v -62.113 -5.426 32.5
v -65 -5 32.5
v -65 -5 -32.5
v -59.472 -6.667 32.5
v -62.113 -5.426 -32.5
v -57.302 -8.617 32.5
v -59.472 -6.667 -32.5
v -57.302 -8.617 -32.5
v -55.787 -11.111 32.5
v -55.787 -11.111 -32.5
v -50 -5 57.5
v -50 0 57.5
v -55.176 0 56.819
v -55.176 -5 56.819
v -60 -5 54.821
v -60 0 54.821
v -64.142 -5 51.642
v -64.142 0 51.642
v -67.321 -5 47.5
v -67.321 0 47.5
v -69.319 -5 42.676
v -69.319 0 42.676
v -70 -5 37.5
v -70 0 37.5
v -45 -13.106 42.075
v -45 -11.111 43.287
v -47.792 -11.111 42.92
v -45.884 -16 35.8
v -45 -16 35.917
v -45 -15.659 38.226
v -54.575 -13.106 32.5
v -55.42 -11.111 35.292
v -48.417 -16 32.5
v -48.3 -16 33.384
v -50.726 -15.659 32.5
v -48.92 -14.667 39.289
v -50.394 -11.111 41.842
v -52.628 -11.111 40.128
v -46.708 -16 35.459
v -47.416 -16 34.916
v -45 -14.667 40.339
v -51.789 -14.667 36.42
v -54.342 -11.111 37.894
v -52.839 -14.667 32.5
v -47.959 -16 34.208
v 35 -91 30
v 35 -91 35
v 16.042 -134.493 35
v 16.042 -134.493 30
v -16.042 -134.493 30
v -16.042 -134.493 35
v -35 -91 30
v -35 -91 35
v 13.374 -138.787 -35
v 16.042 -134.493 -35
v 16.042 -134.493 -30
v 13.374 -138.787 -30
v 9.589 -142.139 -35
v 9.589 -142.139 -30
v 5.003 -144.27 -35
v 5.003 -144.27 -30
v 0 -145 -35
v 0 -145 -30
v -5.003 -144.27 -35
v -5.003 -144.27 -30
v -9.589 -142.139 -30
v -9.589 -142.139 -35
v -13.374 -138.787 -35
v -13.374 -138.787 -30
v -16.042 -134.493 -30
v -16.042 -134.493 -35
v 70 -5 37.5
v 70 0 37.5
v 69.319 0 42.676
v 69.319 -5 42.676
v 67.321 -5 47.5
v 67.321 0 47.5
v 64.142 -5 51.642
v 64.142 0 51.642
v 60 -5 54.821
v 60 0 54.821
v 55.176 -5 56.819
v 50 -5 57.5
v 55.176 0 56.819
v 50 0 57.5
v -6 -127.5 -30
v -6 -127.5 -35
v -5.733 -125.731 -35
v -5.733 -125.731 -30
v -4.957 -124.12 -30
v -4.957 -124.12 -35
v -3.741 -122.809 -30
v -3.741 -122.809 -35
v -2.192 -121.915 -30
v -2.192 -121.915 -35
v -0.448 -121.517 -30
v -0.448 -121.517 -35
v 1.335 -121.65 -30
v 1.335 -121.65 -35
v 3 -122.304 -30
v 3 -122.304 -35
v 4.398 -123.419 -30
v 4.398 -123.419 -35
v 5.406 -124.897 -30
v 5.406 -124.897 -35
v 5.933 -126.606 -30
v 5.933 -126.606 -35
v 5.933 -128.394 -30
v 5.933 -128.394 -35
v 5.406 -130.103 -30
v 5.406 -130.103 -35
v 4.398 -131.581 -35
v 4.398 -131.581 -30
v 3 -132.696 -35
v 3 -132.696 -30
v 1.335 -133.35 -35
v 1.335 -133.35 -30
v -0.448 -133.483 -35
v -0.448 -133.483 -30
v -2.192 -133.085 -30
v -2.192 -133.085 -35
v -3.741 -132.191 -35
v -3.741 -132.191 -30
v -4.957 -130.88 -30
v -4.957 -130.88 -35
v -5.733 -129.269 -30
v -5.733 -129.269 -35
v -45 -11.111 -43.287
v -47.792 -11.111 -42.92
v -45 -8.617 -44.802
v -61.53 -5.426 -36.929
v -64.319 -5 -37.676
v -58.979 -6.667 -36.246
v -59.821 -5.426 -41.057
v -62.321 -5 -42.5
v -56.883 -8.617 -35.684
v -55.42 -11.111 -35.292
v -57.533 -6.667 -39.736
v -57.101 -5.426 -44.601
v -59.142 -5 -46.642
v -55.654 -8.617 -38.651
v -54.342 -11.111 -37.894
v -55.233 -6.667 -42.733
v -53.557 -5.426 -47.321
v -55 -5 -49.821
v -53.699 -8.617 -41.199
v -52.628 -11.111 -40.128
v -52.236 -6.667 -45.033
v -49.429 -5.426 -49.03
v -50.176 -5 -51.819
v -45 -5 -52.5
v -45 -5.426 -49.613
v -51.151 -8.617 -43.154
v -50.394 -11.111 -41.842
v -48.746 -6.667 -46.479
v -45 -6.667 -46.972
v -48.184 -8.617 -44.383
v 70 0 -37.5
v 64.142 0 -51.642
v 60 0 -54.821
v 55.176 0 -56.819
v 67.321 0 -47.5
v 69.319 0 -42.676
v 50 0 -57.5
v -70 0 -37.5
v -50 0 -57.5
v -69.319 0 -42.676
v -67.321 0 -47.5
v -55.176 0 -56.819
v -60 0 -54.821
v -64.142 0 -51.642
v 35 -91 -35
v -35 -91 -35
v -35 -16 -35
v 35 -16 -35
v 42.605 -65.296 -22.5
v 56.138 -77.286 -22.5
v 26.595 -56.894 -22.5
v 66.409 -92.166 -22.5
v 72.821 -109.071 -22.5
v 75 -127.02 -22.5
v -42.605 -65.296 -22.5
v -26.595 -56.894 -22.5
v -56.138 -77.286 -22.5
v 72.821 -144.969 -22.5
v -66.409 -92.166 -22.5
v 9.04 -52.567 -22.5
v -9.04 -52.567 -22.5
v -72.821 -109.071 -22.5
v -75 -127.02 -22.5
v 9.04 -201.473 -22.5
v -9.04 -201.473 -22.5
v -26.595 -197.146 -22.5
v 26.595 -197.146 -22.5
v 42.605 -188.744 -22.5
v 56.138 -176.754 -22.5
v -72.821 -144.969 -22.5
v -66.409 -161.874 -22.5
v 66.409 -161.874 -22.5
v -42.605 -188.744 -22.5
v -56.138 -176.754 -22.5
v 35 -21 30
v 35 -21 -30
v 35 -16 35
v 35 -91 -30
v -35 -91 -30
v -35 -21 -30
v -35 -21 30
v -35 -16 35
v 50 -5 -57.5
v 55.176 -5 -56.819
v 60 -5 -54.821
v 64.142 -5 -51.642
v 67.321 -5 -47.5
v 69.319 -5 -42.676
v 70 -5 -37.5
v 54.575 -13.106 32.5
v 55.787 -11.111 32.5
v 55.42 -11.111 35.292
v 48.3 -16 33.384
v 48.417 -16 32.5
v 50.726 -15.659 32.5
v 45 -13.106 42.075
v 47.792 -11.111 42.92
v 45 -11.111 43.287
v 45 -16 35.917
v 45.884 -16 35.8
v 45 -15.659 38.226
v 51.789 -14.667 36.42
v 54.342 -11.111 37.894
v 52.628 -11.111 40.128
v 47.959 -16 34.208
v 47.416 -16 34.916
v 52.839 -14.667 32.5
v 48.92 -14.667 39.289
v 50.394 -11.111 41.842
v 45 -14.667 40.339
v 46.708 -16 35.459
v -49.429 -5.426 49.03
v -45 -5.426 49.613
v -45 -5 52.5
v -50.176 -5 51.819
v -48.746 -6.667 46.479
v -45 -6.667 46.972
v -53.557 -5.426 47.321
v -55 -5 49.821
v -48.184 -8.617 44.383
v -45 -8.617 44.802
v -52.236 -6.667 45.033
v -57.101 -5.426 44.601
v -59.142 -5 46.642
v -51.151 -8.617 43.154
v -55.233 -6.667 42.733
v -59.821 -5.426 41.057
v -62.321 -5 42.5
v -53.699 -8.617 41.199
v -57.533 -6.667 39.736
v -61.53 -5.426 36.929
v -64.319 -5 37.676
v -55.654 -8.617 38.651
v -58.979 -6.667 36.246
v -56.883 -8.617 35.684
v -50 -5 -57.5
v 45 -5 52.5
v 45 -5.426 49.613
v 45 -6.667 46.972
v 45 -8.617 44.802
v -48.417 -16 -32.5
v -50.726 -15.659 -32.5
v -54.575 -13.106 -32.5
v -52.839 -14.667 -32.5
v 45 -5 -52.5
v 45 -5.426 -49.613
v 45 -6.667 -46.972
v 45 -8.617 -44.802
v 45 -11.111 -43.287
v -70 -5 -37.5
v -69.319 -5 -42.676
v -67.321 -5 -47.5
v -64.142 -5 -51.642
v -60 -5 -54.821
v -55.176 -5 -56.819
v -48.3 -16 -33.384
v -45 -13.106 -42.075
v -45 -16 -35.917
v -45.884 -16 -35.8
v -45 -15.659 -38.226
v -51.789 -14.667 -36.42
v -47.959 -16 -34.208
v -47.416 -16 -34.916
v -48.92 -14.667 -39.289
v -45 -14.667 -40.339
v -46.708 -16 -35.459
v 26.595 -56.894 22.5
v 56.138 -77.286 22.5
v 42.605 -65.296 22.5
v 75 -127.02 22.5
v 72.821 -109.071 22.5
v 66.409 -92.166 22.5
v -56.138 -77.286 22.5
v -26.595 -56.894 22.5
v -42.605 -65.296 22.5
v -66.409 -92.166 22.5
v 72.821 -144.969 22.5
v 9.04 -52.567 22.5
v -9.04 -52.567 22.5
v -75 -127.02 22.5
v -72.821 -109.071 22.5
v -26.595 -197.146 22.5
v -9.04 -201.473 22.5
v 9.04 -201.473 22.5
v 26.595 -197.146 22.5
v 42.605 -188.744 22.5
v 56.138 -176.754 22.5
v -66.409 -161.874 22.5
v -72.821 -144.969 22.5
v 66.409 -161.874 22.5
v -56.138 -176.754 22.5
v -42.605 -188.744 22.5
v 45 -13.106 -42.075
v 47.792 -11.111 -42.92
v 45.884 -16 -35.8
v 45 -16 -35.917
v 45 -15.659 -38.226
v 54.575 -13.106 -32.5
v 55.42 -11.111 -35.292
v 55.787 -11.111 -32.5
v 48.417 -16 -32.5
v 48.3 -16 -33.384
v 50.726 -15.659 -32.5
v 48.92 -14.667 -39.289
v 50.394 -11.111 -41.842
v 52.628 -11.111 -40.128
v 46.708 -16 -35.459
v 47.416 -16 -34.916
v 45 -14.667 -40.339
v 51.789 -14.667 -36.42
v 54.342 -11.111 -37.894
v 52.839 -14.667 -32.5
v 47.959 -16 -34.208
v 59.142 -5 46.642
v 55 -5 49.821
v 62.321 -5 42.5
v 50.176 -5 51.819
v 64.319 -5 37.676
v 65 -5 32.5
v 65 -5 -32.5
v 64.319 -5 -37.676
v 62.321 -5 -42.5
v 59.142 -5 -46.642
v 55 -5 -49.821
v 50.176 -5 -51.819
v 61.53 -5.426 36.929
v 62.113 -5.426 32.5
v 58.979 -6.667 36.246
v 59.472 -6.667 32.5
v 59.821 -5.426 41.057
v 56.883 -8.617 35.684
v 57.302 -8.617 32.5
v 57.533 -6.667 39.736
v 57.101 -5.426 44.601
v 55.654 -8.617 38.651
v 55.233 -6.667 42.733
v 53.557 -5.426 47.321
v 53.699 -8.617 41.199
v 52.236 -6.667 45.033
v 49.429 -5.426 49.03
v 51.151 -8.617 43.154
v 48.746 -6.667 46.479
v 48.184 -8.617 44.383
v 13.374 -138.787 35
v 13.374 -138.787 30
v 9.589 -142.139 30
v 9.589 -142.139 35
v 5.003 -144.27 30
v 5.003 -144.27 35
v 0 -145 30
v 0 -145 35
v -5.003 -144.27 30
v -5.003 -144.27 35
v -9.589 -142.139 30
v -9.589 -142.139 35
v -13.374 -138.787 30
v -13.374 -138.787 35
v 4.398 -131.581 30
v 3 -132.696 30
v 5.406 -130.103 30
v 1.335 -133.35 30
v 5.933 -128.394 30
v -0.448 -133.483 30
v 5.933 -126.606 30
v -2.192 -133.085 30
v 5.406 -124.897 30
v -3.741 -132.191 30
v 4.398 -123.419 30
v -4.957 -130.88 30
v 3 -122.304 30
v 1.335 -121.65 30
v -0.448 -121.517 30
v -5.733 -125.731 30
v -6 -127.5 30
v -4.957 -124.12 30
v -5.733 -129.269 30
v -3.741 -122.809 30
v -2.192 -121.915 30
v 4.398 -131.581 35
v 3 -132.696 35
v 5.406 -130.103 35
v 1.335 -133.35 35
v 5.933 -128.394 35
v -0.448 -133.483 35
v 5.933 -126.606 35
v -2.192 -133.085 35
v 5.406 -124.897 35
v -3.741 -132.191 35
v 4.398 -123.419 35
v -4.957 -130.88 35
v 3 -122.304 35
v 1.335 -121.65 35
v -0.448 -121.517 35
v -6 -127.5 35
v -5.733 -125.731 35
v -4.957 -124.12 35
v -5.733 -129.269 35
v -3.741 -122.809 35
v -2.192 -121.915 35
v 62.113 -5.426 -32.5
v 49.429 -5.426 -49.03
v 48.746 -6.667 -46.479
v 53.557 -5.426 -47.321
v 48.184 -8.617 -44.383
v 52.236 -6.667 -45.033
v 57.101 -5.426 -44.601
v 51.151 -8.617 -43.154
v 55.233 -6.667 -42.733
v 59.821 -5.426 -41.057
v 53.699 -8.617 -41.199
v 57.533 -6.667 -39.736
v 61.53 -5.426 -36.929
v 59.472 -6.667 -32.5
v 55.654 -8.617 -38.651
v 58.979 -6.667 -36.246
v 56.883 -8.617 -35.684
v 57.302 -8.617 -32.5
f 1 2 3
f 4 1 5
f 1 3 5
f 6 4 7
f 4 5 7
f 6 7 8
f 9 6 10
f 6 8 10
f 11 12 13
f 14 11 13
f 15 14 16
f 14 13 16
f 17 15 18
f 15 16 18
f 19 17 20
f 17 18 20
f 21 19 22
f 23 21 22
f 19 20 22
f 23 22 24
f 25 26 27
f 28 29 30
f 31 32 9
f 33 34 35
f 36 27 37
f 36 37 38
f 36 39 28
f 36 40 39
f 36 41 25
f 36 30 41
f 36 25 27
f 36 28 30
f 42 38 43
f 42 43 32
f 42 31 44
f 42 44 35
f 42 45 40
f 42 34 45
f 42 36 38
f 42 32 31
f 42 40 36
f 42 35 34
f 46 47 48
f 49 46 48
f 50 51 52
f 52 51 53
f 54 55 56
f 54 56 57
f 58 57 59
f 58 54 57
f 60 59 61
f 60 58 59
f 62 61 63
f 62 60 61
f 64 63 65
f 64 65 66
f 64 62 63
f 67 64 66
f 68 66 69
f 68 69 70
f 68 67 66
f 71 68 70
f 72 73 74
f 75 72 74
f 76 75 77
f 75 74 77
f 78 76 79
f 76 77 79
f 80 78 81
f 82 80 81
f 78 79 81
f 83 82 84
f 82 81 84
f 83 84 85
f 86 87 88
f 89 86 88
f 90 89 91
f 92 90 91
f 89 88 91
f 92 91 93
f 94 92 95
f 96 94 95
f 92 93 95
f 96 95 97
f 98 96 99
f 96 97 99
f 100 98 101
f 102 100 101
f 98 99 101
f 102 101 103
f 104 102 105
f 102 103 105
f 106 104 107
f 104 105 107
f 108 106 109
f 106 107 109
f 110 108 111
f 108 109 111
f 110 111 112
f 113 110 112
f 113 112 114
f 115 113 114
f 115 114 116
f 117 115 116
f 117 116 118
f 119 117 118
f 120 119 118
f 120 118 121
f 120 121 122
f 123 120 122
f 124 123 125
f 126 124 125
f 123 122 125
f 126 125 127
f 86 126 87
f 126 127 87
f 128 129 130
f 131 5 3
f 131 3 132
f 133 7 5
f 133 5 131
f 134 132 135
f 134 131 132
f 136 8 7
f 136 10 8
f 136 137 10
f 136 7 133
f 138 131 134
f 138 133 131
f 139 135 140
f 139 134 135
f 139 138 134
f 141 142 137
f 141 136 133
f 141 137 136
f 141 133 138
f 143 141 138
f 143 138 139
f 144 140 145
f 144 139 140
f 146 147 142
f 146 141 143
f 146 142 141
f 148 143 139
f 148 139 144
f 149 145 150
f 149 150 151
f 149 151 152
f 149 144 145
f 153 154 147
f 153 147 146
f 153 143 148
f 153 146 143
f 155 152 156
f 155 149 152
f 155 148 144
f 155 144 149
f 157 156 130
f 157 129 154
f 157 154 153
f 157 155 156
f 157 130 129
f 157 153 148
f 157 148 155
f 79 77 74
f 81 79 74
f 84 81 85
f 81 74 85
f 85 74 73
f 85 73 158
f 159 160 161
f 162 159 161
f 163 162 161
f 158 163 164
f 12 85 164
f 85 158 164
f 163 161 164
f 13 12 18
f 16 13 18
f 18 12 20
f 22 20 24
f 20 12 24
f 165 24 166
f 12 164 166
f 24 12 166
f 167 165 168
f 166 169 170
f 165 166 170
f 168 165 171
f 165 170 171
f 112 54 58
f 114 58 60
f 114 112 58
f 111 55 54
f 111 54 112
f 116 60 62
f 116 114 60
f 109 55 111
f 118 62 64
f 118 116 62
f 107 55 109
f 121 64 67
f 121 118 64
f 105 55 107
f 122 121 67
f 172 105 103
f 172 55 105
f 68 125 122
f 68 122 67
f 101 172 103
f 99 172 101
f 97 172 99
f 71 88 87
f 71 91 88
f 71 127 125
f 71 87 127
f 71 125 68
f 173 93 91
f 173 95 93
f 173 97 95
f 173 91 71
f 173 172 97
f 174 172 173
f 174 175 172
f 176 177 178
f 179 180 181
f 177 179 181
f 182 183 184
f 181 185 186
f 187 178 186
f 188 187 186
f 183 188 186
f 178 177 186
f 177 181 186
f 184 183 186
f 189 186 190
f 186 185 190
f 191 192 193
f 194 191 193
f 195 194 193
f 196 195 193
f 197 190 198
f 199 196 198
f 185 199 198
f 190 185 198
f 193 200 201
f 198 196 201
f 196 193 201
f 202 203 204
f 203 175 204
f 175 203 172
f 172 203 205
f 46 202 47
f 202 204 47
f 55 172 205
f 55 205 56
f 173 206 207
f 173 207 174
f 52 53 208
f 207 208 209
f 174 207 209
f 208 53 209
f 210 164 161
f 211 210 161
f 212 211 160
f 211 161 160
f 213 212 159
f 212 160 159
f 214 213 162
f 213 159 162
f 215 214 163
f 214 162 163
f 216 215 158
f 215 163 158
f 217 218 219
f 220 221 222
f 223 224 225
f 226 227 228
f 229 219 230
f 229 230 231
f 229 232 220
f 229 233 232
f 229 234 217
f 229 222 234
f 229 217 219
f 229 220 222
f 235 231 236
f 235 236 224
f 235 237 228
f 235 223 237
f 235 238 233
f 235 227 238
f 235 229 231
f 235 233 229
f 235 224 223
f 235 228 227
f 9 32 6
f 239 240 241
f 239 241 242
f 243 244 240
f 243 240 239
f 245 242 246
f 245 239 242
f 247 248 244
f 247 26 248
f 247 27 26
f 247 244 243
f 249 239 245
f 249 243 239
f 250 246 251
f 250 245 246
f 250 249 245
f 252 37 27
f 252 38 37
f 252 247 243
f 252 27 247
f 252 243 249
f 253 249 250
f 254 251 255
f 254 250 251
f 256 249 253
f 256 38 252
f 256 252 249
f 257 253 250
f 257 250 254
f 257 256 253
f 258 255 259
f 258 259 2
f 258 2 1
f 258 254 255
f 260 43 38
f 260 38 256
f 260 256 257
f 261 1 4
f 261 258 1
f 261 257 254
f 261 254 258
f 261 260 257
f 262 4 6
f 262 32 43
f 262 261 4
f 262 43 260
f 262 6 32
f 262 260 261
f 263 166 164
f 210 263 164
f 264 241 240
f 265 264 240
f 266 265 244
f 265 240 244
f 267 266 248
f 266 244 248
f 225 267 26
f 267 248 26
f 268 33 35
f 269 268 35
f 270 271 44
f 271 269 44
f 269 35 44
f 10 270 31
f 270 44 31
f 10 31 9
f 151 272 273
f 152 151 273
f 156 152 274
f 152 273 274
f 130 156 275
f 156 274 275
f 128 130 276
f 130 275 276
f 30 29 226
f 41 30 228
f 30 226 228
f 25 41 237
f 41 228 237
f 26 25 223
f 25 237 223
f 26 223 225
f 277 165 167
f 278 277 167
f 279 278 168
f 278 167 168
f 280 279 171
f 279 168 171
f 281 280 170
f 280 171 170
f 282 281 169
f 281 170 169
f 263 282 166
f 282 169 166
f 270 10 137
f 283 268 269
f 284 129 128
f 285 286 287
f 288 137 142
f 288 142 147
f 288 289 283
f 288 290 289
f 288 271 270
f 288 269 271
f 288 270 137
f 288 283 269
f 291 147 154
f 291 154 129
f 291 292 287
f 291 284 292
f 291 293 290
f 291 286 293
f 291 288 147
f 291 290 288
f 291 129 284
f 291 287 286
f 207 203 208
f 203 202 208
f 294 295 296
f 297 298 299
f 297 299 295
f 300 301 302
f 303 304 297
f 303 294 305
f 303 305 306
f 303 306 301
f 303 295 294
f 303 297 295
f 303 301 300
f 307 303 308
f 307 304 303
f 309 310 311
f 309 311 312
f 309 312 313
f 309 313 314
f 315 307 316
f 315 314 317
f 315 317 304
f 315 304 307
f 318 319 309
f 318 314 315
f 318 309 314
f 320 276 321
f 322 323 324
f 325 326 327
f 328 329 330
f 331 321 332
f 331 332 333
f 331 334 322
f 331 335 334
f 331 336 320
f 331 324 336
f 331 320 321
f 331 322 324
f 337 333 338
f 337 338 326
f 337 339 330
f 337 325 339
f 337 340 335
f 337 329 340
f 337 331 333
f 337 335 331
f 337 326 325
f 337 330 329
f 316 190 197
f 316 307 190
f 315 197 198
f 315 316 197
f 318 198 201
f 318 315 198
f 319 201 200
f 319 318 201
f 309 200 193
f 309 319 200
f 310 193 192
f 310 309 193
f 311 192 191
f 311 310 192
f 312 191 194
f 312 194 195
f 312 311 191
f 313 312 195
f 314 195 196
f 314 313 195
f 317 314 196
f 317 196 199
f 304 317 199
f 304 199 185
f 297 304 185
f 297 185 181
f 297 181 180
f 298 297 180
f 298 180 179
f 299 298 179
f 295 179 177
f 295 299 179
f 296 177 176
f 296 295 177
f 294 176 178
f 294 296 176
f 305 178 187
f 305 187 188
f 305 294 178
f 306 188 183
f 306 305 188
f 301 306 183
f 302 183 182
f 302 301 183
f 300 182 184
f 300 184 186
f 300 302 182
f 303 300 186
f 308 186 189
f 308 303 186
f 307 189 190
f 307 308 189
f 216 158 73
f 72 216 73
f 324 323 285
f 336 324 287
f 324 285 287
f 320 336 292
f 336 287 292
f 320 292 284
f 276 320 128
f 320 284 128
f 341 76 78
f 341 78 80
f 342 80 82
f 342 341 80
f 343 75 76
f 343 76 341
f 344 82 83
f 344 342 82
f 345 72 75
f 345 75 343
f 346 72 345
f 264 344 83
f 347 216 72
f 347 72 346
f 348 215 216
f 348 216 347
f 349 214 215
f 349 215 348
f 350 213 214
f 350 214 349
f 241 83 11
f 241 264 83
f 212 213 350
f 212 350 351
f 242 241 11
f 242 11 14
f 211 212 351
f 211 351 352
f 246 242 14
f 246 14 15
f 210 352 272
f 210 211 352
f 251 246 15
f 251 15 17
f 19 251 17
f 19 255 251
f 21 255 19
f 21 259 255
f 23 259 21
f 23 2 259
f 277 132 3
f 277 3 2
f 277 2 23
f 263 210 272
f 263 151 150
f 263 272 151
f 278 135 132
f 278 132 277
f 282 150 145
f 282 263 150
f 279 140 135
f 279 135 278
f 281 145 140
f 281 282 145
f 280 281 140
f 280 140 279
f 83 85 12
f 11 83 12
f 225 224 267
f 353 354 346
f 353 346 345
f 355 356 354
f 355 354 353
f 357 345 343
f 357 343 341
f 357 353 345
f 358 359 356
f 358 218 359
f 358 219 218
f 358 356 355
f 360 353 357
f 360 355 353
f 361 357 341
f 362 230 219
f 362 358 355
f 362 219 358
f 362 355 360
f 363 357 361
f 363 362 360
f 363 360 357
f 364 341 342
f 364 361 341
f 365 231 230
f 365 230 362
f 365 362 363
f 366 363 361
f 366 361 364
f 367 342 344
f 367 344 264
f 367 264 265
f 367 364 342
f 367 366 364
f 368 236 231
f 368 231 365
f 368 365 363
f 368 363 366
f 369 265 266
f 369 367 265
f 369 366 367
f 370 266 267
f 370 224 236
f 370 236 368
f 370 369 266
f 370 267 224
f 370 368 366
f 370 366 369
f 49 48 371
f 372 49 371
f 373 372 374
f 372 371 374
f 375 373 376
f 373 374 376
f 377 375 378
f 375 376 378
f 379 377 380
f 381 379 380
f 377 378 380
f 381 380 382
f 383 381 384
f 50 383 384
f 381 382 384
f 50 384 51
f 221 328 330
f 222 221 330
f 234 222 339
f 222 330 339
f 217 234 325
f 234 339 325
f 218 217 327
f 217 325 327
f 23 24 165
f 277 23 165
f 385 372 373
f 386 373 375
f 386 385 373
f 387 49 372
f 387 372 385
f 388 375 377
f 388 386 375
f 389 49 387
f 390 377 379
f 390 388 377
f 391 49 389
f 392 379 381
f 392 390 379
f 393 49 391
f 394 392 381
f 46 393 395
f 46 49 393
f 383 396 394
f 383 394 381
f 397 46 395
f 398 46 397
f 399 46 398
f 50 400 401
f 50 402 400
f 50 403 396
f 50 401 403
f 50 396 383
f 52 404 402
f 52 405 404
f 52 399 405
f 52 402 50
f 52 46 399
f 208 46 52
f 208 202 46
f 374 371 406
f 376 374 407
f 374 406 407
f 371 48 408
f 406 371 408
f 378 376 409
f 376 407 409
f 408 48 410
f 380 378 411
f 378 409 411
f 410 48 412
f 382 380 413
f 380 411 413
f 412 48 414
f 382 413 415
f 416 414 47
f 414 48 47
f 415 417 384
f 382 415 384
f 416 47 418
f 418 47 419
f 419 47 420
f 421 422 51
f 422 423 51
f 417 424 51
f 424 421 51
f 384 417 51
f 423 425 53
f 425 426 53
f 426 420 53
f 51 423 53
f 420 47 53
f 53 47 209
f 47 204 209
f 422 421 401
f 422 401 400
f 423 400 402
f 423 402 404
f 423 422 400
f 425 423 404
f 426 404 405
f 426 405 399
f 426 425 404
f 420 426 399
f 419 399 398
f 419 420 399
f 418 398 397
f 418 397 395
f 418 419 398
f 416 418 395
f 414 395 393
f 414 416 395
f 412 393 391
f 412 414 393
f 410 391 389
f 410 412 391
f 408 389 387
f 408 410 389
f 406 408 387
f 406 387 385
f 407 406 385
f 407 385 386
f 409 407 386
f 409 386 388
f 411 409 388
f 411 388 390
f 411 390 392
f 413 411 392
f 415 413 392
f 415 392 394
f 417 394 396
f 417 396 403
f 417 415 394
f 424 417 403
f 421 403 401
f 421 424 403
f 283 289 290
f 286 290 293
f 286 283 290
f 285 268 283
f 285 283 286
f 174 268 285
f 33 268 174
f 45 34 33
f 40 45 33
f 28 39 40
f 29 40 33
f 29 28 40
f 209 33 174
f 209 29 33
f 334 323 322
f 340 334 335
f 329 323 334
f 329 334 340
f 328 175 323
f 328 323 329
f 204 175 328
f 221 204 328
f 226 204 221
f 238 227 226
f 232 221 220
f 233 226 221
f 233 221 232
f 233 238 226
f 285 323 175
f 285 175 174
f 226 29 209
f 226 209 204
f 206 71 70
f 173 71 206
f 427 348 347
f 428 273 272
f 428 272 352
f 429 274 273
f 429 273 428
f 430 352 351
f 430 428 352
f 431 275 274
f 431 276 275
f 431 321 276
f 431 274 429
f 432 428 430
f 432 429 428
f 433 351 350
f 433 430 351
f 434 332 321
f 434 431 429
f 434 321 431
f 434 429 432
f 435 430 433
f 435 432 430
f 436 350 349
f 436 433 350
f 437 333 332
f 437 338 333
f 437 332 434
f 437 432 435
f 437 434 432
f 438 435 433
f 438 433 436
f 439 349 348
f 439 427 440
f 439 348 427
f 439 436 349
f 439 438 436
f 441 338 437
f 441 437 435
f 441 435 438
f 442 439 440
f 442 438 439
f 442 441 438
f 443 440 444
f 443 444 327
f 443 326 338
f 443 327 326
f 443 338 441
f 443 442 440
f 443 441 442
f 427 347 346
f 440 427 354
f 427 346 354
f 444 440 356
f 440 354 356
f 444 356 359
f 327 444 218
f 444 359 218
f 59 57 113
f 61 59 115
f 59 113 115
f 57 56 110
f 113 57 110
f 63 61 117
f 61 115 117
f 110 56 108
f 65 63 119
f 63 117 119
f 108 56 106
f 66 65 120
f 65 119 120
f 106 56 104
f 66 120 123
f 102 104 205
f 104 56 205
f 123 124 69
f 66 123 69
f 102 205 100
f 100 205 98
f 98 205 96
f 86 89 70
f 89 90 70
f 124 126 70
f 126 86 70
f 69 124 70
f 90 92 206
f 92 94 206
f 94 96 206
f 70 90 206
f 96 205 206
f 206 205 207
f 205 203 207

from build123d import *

# Parameters (mm, degrees)
BOSS_EXTRUDE1_DEPTH = 5
BOSS_EXTRUDE2_DEPTH = 11
FILLET1_R           = 10
FILLET2_R           = 8
BOSS_EXTRUDE3_DEPTH = 5
SKETCH4_R           = 6.000000000000002
BOSS_EXTRUDE4_DEPTH = 5
SKETCH5_R           = 75.00000000000001
BOSS_EXTRUDE5_DEPTH = 22.5


with BuildPart() as part:
    # Sketch1 → Boss-Extrude1 (new body)
    with BuildSketch(Plane(origin=(0, 0, 0), x_dir=(1, 0, 0), z_dir=(0, 1, 0))):
        with BuildLine():
            Line((-49.999999999999865, 57.49999999999999), (49.99999999999988, 57.49999999999999))
            ThreePointArc((49.99999999999988, 57.49999999999999), (64.14213562373095, 51.642135623730944), (70, 37.499999999999865))
            Line((70, 37.499999999999865), (70.00000000000003, -37.49999999999986))
            ThreePointArc((70.00000000000003, -37.49999999999986), (64.14213562373098, -51.64213562373095), (49.99999999999989, -57.5))
            Line((49.99999999999989, -57.5), (-49.99999999999985, -57.5))
            ThreePointArc((-49.99999999999985, -57.5), (-64.14213562373095, -51.642135623730944), (-69.99999999999999, -37.49999999999986))
            Line((-69.99999999999999, -37.49999999999986), (-70, 37.49999999999985))
            ThreePointArc((-70, 37.49999999999985), (-64.14213562373095, 51.64213562373094), (-49.999999999999865, 57.49999999999999))
        make_face()
    extrude(amount=-BOSS_EXTRUDE1_DEPTH)

    # Sketch2 → Boss-Extrude2 (add)
    with BuildSketch(Plane.XZ.offset(5)):
        with BuildLine():
            Line((-54.999999999999986, 32.5), (-55.00000000000001, -32.49999999999999))
            ThreePointArc((-55.00000000000001, -32.49999999999999), (-52.07106781186548, -39.571067811865476), (-45, -42.49999999999999))
            Line((-45, -42.49999999999999), (45.000000000000014, -42.499999999999986))
            ThreePointArc((45.000000000000014, -42.499999999999986), (52.07106781186548, -39.57106781186546), (55.00000000000002, -32.5))
            Line((55.00000000000002, -32.5), (55.00000000000003, 32.5))
            ThreePointArc((55.00000000000003, 32.5), (52.07106781186551, 39.571067811865476), (45.000000000000036, 42.5))
            Line((45.000000000000036, 42.5), (-45, 42.49999999999999))
            ThreePointArc((-45, 42.49999999999999), (-52.07106781186546, 39.57106781186547), (-54.999999999999986, 32.5))
        make_face()
    extrude(amount=BOSS_EXTRUDE2_DEPTH)

    # Fillet1
    fillet1_edges = [part.edges().sort_by_distance(p)[0] for p in [
        (-52.07106781186548, -5, -39.571067811865476),
        (7.11e-15, -5, -42.499999999999986),
        (52.07106781186548, -5, -39.57106781186546),
        (55.00000000000003, -5, 0),
        (52.07106781186551, -5, 39.571067811865476),
        (2.132e-14, -5, 42.5),
        (-52.07106781186546, -5, 39.57106781186547),
        (-55, -5, 0),
    ]]
    fillet(fillet1_edges, radius=FILLET1_R)

    # Fillet2
    # the kernel refuses this fillet: 8 mm, written as the material it takes off along each edge
    with BuildSketch(Plane(origin=(-44.999999999999986, -16, 32.5), x_dir=(-1.42e-15, 0, 1), z_dir=(1, 0, 1.42e-15))) as fillet2_piece_1:
        with BuildLine():
            CenterArc((3.4168760482229885, -7.9999999999999964), FILLET2_R, 22.885380476158534, 67.11461952384147)
            Line((3.4168760482229885, 3.55e-15), (3.4168760482229885, 0.8000000000000043))
            Line((3.4168760482229885, 0.8000000000000043), (10, 0.8000000000000007))
            Line((10, 0.8000000000000007), (10.799999999999997, 0))
            ThreePointArc((10.799999999999997, 0), (10.799999999999997, -1.0000000000000053), (11.52418109131397, -4.577777777777779))
            Line((11.52418109131397, -4.577777777777779), (10.787153360123881, -4.888888888888889))
        make_face()
    revolve(axis=Axis((-44.999999999999986, -16, 32.5), (0, -1, 0)), revolution_arc=89.99999999999993, mode=Mode.SUBTRACT)
    with BuildSketch(Plane(origin=(45.000000000000036, -16, 42.5), x_dir=(0, 0.987284800910229, 0.15896138490730852), z_dir=(-1, 0, -8e-17))) as fillet2_piece_2:
        with BuildLine():
            CenterArc((6.8518159068908835, 7.771109299355987), FILLET2_R, 189.14661643898233, 67.11461952384138)
            Line((-1.0464625003909451, 6.499418220097512), (-1.8362903411191291, 6.372249112171666))
            Line((-1.8362903411191291, 6.372249112171666), (-0.7898278407281839, -0.12716910792584693))
            Line((-0.7898278407281839, -0.12716910792584693), (0.12716910792584638, -0.7898278407281804))
            ThreePointArc((0.12716910792584638, -0.7898278407281804), (1.1144539088360754, -0.6308664558208719), (4.761856359069408, -0.7771109299355986))
            Line((4.761856359069408, -0.7771109299355986), (4.9518526815986315, -1e-17))
        make_face()
    extrude(amount=90.00000000000003, mode=Mode.SUBTRACT)
    with BuildSketch(Plane(origin=(45.00000000000004, -16, 32.500000000000014), x_dir=(1, 0, -1.42e-15), z_dir=(-1.42e-15, 0, -1))) as fillet2_piece_3:
        with BuildLine():
            CenterArc((3.4168760482229814, -7.999999999999998), FILLET2_R, 22.885380476158563, 67.11461952384144)
            Line((3.4168760482229814, 0), (3.4168760482229814, 0.8000000000000007))
            Line((3.4168760482229814, 0.8000000000000007), (9.999999999999986, 0.8000000000000007))
            Line((9.999999999999986, 0.8000000000000007), (10.799999999999983, 0))
            ThreePointArc((10.799999999999983, 0), (10.799999999999983, -1.0000000000000018), (11.524181091313956, -4.5777777777777775))
            Line((11.524181091313956, -4.5777777777777775), (10.787153360123867, -4.888888888888889))
        make_face()
    revolve(axis=Axis((45.00000000000004, -16, 32.500000000000014), (0, -1, 0)), revolution_arc=90.00000000000013, mode=Mode.SUBTRACT)
    with BuildSketch(Plane(origin=(55.00000000000002, -16, -32.5), x_dir=(0.15896138490730993, 0.9872848009102289, 0), z_dir=(1.1e-16, 0, 1))) as fillet2_piece_4:
        with BuildLine():
            CenterArc((6.851815906890875, 7.771109299355992), FILLET2_R, 189.14661643898236, 67.1146195238415)
            Line((-1.0464625003909545, 6.499418220097512), (-1.8362903411191382, 6.372249112171664))
            Line((-1.8362903411191382, 6.372249112171664), (-0.7898278407281838, -0.12716910792584807))
            Line((-0.7898278407281838, -0.12716910792584807), (0.12716910792584749, -0.7898278407281802))
            ThreePointArc((0.12716910792584749, -0.7898278407281802), (1.1144539088360774, -0.6308664558208774), (4.7618563590694105, -0.7771109299355988))
            Line((4.7618563590694105, -0.7771109299355988), (4.951852681598634, 8e-17))
        make_face()
    extrude(amount=65, mode=Mode.SUBTRACT)
    with BuildSketch(Plane(origin=(45, -16, -32.499999999999964), x_dir=(1.42e-15, 0, -1), z_dir=(-1, 0, -1.42e-15))) as fillet2_piece_5:
        with BuildLine():
            CenterArc((3.416876048223024, -7.9999999999999964), FILLET2_R, 22.885380476158556, 67.1146195238415)
            Line((3.416876048223017, 3.55e-15), (3.416876048223017, 0.8000000000000043))
            Line((3.416876048223017, 0.8000000000000043), (10.000000000000021, 0.8000000000000007))
            Line((10.000000000000021, 0.8000000000000007), (10.800000000000018, 0))
            ThreePointArc((10.800000000000018, 0), (10.800000000000018, -1.0000000000000018), (11.524181091314006, -4.577777777777774))
            Line((11.524181091314006, -4.577777777777774), (10.787153360123916, -4.888888888888886))
        make_face()
    revolve(axis=Axis((45, -16, -32.499999999999964), (0, -1, 0)), revolution_arc=89.99999999999972, mode=Mode.SUBTRACT)
    with BuildSketch(Plane(origin=(-45, -16, -42.49999999999999), x_dir=(0, 0.987284800910229, -0.15896138490730852), z_dir=(1, 0, 8e-17))) as fillet2_piece_6:
        with BuildLine():
            CenterArc((6.8518159068908835, 7.771109299355987), FILLET2_R, 189.14661643898233, 67.11461952384138)
            Line((-1.0464625003909451, 6.499418220097512), (-1.8362903411191291, 6.372249112171666))
            Line((-1.8362903411191291, 6.372249112171666), (-0.7898278407281839, -0.12716910792584693))
            Line((-0.7898278407281839, -0.12716910792584693), (0.12716910792584638, -0.7898278407281804))
            ThreePointArc((0.12716910792584638, -0.7898278407281804), (1.1144539088360754, -0.6308664558208719), (4.761856359069408, -0.7771109299355986))
            Line((4.761856359069408, -0.7771109299355986), (4.9518526815986315, -1e-17))
        make_face()
    extrude(amount=90.00000000000001, mode=Mode.SUBTRACT)
    with BuildSketch(Plane(origin=(-45.000000000000014, -16, -32.50000000000001), x_dir=(-1, 0, 1.42e-15), z_dir=(1.42e-15, 0, 1))) as fillet2_piece_7:
        with BuildLine():
            CenterArc((3.4168760482229885, -7.999999999999998), FILLET2_R, 22.885380476158545, 67.11461952384145)
            Line((3.4168760482229885, 0), (3.4168760482229885, 0.8000000000000007))
            Line((3.4168760482229885, 0.8000000000000007), (9.999999999999986, 0.8000000000000007))
            Line((9.999999999999986, 0.8000000000000007), (10.799999999999983, 0))
            ThreePointArc((10.799999999999983, 0), (10.799999999999983, -1.0000000000000018), (11.52418109131397, -4.5777777777777775))
            Line((11.52418109131397, -4.5777777777777775), (10.787153360123881, -4.888888888888889))
        make_face()
    revolve(axis=Axis((-45.000000000000014, -16, -32.50000000000001), (0, -1, 0)), revolution_arc=90.00000000000017, mode=Mode.SUBTRACT)
    with BuildSketch(Plane(origin=(-54.999999999999986, -16, 32.5), x_dir=(-0.15896138490730852, 0.987284800910229, 0), z_dir=(-3.3e-16, 0, -1))) as fillet2_piece_8:
        with BuildLine():
            CenterArc((6.8518159068908835, 7.771109299355987), FILLET2_R, 189.14661643898228, 67.1146195238415)
            Line((-1.0464625003909462, 6.499418220097519), (-1.83629034111913, 6.372249112171672))
            Line((-1.83629034111913, 6.372249112171672), (-0.7898278407281839, -0.12716910792584693))
            Line((-0.7898278407281839, -0.12716910792584693), (0.12716910792584638, -0.7898278407281804))
            ThreePointArc((0.12716910792584638, -0.7898278407281804), (1.1144539088360754, -0.6308664558208719), (4.761856359069408, -0.7771109299355987))
            Line((4.761856359069408, -0.7771109299355987), (4.951852681598632, 4e-17))
        make_face()
    extrude(amount=65, mode=Mode.SUBTRACT)

    # Sketch3 → Boss-Extrude3 (add)
    with BuildSketch(Plane.XZ.offset(16)):
        Polygon((-35.00000000000001, 35), (34.99999999999999, 35), (34.99999999999999, -35), (-35, -35), align=None)
    extrude(amount=BOSS_EXTRUDE3_DEPTH)

    # Sketch4 → Boss-Extrude4 (add)
    with BuildSketch(Plane(origin=(0, 0, -35), x_dir=(-1, 0, 0), z_dir=(0, 0, -1))):
        with BuildLine():
            Line((-34.99999999999999, -21), (-34.999999999999986, -91.00000000000001))
            Line((-34.999999999999986, -91.00000000000001), (-16.042254413814177, -134.49257272557526))
            ThreePointArc((-16.042254413814177, -134.49257272557526), (1.925e-14, -145), (16.04225441381421, -134.49257272557526))
            Line((16.04225441381421, -134.49257272557526), (35.00000000000001, -91))
            Line((35.00000000000001, -91), (35, -21))
            Line((35, -21), (-34.99999999999999, -21))
        make_face()
        with Locations((1.818e-14, -127.5)):
            Circle(SKETCH4_R, mode=Mode.SUBTRACT)
    boss_extrude4 = extrude(amount=-BOSS_EXTRUDE4_DEPTH)

    # Mirror1: Boss-Extrude4 across plane
    add(boss_extrude4.mirror(Plane.XY))


with BuildPart() as body_2:
    # Sketch5 → Boss-Extrude5 (new, symmetric)
    with BuildSketch(Plane.XY):
        with Locations(Location((0, -127.02013928772499, 0), (0, 0, 180))):
            Circle(SKETCH5_R)
    extrude(amount=BOSS_EXTRUDE5_DEPTH, both=True)


solid = Compound([part.part, body_2.part])
